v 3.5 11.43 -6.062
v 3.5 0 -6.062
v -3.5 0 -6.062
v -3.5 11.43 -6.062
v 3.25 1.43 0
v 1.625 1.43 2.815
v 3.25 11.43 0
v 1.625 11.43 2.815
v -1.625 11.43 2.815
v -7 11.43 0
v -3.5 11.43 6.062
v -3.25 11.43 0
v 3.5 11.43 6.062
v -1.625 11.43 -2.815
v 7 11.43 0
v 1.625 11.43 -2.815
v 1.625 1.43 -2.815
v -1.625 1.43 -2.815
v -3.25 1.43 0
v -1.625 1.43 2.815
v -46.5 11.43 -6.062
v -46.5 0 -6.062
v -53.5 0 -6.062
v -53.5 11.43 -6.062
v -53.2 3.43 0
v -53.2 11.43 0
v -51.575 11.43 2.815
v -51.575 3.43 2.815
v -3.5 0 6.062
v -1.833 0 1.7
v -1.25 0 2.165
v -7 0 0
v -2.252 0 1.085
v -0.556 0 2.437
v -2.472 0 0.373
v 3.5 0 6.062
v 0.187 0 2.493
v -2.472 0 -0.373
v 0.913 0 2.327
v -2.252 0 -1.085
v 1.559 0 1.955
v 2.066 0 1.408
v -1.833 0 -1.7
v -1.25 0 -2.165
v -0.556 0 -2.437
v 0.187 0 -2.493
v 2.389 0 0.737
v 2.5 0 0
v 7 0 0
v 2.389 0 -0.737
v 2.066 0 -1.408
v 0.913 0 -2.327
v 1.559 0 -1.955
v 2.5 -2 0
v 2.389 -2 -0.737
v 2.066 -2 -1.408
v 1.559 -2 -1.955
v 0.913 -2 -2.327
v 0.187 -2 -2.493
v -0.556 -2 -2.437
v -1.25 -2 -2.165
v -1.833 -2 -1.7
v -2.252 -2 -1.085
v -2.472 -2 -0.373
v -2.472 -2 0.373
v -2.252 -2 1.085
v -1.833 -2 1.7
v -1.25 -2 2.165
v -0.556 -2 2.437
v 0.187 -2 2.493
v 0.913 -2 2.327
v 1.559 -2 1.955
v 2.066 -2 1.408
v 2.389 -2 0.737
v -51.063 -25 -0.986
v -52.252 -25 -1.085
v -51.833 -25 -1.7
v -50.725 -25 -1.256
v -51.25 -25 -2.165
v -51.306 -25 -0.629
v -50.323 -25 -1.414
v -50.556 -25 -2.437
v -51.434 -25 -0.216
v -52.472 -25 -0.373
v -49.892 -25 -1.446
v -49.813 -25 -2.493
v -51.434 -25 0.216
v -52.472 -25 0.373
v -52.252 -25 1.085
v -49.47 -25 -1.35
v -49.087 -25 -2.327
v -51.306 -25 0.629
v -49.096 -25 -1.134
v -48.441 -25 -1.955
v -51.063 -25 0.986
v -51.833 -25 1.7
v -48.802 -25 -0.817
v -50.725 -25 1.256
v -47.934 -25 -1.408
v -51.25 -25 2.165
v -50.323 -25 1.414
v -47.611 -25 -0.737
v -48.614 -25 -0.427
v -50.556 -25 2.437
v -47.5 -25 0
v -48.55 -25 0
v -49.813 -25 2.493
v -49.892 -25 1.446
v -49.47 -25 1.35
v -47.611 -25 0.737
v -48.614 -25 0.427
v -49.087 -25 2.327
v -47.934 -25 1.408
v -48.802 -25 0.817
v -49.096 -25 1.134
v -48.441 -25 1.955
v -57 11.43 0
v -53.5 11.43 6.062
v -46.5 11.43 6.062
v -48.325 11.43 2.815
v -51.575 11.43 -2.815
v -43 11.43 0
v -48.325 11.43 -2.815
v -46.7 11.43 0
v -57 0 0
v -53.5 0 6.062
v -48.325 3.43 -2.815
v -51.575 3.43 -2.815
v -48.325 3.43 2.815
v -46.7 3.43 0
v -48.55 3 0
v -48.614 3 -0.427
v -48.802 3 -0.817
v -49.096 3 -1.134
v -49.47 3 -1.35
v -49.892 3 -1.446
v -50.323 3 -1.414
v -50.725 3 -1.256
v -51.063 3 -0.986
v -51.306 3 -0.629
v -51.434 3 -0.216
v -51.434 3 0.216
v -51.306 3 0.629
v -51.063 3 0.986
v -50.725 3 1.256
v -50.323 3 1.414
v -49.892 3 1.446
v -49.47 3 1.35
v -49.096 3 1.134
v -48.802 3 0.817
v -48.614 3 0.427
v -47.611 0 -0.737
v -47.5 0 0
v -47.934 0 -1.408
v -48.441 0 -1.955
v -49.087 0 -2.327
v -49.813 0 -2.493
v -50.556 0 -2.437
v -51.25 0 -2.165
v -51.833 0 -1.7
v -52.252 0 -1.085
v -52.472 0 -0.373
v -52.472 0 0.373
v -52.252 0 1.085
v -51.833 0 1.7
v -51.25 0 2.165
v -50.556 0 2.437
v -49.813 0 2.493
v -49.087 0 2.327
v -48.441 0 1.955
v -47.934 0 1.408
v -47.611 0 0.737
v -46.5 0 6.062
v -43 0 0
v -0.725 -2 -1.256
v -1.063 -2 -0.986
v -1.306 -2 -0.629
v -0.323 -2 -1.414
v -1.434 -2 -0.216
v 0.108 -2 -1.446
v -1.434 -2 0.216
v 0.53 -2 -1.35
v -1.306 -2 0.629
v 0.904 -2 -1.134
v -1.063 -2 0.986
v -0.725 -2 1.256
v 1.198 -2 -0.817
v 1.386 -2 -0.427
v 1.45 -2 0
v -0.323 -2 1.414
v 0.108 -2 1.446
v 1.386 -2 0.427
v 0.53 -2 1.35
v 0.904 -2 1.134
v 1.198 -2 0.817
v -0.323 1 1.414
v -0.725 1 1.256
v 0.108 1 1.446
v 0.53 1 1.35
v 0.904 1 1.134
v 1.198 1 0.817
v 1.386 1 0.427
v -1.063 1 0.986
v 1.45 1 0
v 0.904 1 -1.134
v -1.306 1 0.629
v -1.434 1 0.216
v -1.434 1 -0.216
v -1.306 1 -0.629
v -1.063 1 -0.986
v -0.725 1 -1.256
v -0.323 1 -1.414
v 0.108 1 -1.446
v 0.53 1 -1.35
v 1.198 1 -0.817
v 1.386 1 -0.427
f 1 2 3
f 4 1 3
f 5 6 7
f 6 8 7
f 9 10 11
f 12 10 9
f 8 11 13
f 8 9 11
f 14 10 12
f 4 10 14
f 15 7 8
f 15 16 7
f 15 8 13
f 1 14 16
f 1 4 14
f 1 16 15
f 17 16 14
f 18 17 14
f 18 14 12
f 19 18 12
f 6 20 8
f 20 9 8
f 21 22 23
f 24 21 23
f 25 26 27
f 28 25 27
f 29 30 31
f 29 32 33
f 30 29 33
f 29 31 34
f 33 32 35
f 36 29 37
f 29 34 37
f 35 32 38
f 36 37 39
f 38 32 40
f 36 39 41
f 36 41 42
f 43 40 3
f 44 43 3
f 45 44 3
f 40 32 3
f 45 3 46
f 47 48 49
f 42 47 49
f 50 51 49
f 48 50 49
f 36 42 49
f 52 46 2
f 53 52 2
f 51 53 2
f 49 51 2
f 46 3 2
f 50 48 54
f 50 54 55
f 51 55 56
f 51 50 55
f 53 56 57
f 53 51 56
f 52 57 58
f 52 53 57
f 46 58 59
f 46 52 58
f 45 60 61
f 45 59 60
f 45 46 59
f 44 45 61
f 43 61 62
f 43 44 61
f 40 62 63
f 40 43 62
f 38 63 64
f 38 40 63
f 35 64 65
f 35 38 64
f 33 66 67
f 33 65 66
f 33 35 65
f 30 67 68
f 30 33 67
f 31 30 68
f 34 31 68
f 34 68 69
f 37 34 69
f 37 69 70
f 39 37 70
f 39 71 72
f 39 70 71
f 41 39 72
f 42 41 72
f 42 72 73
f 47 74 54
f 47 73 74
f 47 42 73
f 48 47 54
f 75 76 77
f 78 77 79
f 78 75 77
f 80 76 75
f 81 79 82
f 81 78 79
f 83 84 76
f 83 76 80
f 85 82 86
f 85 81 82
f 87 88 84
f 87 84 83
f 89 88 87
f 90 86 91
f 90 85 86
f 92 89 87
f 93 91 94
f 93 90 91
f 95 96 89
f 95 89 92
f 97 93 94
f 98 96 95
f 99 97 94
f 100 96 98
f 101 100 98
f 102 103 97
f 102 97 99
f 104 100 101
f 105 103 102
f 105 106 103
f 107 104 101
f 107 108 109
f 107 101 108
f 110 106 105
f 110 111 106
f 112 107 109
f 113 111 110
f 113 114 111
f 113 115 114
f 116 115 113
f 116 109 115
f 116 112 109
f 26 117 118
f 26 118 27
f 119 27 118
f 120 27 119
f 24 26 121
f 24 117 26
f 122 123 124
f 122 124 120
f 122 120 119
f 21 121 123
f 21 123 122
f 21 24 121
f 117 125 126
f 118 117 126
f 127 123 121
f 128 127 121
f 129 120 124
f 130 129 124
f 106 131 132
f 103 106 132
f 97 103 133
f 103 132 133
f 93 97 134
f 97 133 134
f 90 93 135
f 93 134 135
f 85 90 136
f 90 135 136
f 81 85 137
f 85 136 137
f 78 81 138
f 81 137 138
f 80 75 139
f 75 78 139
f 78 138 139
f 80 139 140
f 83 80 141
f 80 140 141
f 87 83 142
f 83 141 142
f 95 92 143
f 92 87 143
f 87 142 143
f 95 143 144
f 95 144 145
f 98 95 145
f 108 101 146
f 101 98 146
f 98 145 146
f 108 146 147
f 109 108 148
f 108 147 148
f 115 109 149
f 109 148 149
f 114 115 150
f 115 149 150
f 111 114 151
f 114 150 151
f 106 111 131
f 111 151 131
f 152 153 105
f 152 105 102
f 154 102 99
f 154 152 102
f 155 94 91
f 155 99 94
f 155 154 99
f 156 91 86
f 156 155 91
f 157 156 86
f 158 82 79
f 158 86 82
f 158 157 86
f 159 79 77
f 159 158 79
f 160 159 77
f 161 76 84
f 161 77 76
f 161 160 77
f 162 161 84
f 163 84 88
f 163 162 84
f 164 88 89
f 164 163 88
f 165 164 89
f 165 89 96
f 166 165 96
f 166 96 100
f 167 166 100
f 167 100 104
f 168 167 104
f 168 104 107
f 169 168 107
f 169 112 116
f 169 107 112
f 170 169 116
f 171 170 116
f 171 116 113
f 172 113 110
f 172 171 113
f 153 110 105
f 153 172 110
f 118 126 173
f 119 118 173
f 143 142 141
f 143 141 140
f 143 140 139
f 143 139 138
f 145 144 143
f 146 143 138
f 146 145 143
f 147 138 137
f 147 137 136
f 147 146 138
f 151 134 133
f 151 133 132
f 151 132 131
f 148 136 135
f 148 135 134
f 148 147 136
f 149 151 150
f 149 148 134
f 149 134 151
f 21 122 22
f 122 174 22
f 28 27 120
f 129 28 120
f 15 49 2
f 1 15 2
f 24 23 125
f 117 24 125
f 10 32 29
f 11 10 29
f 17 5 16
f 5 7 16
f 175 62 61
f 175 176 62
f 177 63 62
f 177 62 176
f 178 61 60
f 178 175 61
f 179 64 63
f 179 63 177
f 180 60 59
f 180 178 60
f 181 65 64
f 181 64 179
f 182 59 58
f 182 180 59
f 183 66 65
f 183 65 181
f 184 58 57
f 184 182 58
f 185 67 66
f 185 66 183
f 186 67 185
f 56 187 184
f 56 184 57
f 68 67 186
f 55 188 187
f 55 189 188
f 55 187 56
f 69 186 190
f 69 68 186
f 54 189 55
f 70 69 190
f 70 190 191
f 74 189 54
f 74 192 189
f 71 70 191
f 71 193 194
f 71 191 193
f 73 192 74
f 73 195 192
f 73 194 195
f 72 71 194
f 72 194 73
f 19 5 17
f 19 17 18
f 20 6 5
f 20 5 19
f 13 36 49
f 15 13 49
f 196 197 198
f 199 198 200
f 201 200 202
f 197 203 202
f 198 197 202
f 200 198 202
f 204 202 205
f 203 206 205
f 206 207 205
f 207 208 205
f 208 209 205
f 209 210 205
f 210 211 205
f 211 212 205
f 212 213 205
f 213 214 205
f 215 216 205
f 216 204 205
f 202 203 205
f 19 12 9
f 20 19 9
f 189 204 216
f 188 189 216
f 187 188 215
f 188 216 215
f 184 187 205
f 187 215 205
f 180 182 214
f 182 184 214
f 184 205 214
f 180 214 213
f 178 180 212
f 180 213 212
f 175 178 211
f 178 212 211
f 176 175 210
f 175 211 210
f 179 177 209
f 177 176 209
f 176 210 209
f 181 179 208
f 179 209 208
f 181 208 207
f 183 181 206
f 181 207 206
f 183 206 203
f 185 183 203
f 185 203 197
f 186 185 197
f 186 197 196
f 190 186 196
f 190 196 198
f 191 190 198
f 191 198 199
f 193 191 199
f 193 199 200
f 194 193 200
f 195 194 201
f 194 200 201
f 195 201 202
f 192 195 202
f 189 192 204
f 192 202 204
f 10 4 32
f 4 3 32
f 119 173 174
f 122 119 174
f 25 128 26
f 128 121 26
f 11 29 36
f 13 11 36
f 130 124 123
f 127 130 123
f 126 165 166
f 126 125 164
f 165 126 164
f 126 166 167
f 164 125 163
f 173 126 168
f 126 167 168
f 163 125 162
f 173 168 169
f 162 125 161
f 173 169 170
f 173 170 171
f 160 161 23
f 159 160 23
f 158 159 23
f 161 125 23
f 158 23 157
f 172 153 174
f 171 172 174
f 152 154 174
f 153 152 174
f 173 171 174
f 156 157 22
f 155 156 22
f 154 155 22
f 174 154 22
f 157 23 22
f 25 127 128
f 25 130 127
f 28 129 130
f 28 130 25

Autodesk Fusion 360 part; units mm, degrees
sketch "Sketch1" plane through (0, 0, 0) normal (0, 1, 0) x (1, 0, 0)
  line L0 (-7, 0) -> (-3.5, -6.0622)
  line L1 (-3.5, -6.0622) -> (3.5, -6.0622)
  line L2 (3.5, -6.0622) -> (7, 0)
  line L3 (7, 0) -> (3.5, 6.0622)
  line L4 (3.5, 6.0622) -> (-3.5, 6.0622)
  line L5 (-3.5, 6.0622) -> (-7, 0)
extrude "Extrude1" add sketch "Sketch1" along normal blind 11.43 makes body 1
sketch "Sketch2" plane through (0, 0, 0) normal (0, -1, 0) x (1, 0, 0)
  line L0 (-7, 0) -> (-3.5, -6.0622)
  line L1 (-3.5, -6.0622) -> (3.5, -6.0622)
  line L2 (3.5, -6.0622) -> (7, 0)
  line L3 (7, 0) -> (3.5, 6.0622)
  line L4 (3.5, 6.0622) -> (-3.5, 6.0622)
  line L5 (-3.5, 6.0622) -> (-7, 0)
  circle A0 centre (0, 0) radius 1.45
  circle A1 centre (0, 0) radius 2.5
  dimension "d3" = 2.9
  dimension "d4" = 5
extrude "Extrude2" add sketch "Sketch2" along normal blind 2 contours A1 bodies 1
extrude "Extrude3" cut 1 faces at (1.0088, 0, 0.1932) along direction (0, 1, 0) blind 1 on bodies 1 bodies 1
sketch "Sketch3" plane through (0, 0, 0) normal (0, 1, 0) x (1, 0, 0)
  line L0 (-43, 0) -> (-46.5, 6.0622)
  line L1 (-46.5, 6.0622) -> (-53.5, 6.0622)
  line L2 (-53.5, 6.0622) -> (-57, 0)
  line L3 (-57, 0) -> (-53.5, -6.0622)
  line L4 (-53.5, -6.0622) -> (-46.5, -6.0622)
  line L5 (-46.5, -6.0622) -> (-43, 0)
  point P0 (-50, 0)
  point P1 (-50, 0)
extrude "Extrude4" add sketch "Sketch3" along normal blind 11.43 separate body makes body 2
sketch "Sketch4" plane through (0, 0, 0) normal (0, -1, 0) x (1, 0, 0)
  line L0 (-43, 0) -> (-46.5, 6.0622)
  line L1 (-46.5, 6.0622) -> (-53.5, 6.0622)
  line L2 (-53.5, 6.0622) -> (-57, 0)
  line L3 (-57, 0) -> (-53.5, -6.0622)
  line L4 (-53.5, -6.0622) -> (-46.5, -6.0622)
  line L5 (-46.5, -6.0622) -> (-43, 0)
  circle A0 centre (-50, 0) radius 1.45
  circle A1 centre (-50, 0) radius 2.5
  dimension "d11" = 2.9
  dimension "d12" = 5
sketch "Sketch5" plane through (0, 11.43, 0) normal (0, 1, 0) x (-1, 0, 0)
  line L0 (3.5, -6.0622) -> (7, 0)
  line L1 (7, 0) -> (3.5, 6.0622)
  line L2 (3.5, 6.0622) -> (-3.5, 6.0622)
  line L3 (-3.5, 6.0622) -> (-7, 0)
  line L4 (-7, 0) -> (-3.5, -6.0622)
  line L5 (-3.5, -6.0622) -> (3.5, -6.0622)
  line L6 (3.25, 0) -> (1.625, 2.8146)
  line L7 (1.625, 2.8146) -> (-1.625, 2.8146)
  line L8 (-1.625, 2.8146) -> (-3.25, 0)
  line L9 (-3.25, 0) -> (-1.625, -2.8146)
  line L10 (-1.625, -2.8146) -> (1.625, -2.8146)
  line L11 (1.625, -2.8146) -> (3.25, 0)
  dimension "d17" = 3.25
extrude "Extrude7" cut sketch "Sketch5" against normal blind 3 contours L6 L7 L8 L9 L10 L11 bodies 1
sketch "Sketch6" plane through (0, 11.43, 0) normal (0, 1, 0) x (-1, 0, 0)
  line L0 (46.5, 6.0622) -> (43, 0)
  line L1 (43, 0) -> (46.5, -6.0622)
  line L2 (46.5, -6.0622) -> (53.5, -6.0622)
  line L3 (53.5, -6.0622) -> (57, 0)
  line L4 (57, 0) -> (53.5, 6.0622)
  line L5 (53.5, 6.0622) -> (46.5, 6.0622)
  line L6 (53.2, 0) -> (51.575, 2.8146)
  line L7 (51.575, 2.8146) -> (48.325, 2.8146)
  line L8 (48.325, 2.8146) -> (46.7, 0)
  line L9 (46.7, 0) -> (48.325, -2.8146)
  line L10 (48.325, -2.8146) -> (51.575, -2.8146)
  line L11 (51.575, -2.8146) -> (53.2, 0)
  point P0 (49.95, 0)
  dimension "d20" = 3.25
extrude "Extrude8" cut sketch "Sketch6" against normal blind 3 contours L6 L7 L8 L9 L10 L11 bodies 2
extrude "Extrude9" add sketch "Sketch4" along normal blind 25 contours A1 bodies 2
extrude "Extrude10" cut sketch "Sketch4" against normal blind 3 contours A0 bodies 2
extrude "Extrude11" cut sketch "Sketch5" against normal blind 10 contours L6 L7 L8 L9 L10 L11 bodies 1
extrude "Extrude12" cut sketch "Sketch6" against normal blind 8 contours L6 L7 L8 L9 L10 L11 bodies 2
extrude "Extrude5" [suppressed]
extrude "Extrude6" [suppressed]
